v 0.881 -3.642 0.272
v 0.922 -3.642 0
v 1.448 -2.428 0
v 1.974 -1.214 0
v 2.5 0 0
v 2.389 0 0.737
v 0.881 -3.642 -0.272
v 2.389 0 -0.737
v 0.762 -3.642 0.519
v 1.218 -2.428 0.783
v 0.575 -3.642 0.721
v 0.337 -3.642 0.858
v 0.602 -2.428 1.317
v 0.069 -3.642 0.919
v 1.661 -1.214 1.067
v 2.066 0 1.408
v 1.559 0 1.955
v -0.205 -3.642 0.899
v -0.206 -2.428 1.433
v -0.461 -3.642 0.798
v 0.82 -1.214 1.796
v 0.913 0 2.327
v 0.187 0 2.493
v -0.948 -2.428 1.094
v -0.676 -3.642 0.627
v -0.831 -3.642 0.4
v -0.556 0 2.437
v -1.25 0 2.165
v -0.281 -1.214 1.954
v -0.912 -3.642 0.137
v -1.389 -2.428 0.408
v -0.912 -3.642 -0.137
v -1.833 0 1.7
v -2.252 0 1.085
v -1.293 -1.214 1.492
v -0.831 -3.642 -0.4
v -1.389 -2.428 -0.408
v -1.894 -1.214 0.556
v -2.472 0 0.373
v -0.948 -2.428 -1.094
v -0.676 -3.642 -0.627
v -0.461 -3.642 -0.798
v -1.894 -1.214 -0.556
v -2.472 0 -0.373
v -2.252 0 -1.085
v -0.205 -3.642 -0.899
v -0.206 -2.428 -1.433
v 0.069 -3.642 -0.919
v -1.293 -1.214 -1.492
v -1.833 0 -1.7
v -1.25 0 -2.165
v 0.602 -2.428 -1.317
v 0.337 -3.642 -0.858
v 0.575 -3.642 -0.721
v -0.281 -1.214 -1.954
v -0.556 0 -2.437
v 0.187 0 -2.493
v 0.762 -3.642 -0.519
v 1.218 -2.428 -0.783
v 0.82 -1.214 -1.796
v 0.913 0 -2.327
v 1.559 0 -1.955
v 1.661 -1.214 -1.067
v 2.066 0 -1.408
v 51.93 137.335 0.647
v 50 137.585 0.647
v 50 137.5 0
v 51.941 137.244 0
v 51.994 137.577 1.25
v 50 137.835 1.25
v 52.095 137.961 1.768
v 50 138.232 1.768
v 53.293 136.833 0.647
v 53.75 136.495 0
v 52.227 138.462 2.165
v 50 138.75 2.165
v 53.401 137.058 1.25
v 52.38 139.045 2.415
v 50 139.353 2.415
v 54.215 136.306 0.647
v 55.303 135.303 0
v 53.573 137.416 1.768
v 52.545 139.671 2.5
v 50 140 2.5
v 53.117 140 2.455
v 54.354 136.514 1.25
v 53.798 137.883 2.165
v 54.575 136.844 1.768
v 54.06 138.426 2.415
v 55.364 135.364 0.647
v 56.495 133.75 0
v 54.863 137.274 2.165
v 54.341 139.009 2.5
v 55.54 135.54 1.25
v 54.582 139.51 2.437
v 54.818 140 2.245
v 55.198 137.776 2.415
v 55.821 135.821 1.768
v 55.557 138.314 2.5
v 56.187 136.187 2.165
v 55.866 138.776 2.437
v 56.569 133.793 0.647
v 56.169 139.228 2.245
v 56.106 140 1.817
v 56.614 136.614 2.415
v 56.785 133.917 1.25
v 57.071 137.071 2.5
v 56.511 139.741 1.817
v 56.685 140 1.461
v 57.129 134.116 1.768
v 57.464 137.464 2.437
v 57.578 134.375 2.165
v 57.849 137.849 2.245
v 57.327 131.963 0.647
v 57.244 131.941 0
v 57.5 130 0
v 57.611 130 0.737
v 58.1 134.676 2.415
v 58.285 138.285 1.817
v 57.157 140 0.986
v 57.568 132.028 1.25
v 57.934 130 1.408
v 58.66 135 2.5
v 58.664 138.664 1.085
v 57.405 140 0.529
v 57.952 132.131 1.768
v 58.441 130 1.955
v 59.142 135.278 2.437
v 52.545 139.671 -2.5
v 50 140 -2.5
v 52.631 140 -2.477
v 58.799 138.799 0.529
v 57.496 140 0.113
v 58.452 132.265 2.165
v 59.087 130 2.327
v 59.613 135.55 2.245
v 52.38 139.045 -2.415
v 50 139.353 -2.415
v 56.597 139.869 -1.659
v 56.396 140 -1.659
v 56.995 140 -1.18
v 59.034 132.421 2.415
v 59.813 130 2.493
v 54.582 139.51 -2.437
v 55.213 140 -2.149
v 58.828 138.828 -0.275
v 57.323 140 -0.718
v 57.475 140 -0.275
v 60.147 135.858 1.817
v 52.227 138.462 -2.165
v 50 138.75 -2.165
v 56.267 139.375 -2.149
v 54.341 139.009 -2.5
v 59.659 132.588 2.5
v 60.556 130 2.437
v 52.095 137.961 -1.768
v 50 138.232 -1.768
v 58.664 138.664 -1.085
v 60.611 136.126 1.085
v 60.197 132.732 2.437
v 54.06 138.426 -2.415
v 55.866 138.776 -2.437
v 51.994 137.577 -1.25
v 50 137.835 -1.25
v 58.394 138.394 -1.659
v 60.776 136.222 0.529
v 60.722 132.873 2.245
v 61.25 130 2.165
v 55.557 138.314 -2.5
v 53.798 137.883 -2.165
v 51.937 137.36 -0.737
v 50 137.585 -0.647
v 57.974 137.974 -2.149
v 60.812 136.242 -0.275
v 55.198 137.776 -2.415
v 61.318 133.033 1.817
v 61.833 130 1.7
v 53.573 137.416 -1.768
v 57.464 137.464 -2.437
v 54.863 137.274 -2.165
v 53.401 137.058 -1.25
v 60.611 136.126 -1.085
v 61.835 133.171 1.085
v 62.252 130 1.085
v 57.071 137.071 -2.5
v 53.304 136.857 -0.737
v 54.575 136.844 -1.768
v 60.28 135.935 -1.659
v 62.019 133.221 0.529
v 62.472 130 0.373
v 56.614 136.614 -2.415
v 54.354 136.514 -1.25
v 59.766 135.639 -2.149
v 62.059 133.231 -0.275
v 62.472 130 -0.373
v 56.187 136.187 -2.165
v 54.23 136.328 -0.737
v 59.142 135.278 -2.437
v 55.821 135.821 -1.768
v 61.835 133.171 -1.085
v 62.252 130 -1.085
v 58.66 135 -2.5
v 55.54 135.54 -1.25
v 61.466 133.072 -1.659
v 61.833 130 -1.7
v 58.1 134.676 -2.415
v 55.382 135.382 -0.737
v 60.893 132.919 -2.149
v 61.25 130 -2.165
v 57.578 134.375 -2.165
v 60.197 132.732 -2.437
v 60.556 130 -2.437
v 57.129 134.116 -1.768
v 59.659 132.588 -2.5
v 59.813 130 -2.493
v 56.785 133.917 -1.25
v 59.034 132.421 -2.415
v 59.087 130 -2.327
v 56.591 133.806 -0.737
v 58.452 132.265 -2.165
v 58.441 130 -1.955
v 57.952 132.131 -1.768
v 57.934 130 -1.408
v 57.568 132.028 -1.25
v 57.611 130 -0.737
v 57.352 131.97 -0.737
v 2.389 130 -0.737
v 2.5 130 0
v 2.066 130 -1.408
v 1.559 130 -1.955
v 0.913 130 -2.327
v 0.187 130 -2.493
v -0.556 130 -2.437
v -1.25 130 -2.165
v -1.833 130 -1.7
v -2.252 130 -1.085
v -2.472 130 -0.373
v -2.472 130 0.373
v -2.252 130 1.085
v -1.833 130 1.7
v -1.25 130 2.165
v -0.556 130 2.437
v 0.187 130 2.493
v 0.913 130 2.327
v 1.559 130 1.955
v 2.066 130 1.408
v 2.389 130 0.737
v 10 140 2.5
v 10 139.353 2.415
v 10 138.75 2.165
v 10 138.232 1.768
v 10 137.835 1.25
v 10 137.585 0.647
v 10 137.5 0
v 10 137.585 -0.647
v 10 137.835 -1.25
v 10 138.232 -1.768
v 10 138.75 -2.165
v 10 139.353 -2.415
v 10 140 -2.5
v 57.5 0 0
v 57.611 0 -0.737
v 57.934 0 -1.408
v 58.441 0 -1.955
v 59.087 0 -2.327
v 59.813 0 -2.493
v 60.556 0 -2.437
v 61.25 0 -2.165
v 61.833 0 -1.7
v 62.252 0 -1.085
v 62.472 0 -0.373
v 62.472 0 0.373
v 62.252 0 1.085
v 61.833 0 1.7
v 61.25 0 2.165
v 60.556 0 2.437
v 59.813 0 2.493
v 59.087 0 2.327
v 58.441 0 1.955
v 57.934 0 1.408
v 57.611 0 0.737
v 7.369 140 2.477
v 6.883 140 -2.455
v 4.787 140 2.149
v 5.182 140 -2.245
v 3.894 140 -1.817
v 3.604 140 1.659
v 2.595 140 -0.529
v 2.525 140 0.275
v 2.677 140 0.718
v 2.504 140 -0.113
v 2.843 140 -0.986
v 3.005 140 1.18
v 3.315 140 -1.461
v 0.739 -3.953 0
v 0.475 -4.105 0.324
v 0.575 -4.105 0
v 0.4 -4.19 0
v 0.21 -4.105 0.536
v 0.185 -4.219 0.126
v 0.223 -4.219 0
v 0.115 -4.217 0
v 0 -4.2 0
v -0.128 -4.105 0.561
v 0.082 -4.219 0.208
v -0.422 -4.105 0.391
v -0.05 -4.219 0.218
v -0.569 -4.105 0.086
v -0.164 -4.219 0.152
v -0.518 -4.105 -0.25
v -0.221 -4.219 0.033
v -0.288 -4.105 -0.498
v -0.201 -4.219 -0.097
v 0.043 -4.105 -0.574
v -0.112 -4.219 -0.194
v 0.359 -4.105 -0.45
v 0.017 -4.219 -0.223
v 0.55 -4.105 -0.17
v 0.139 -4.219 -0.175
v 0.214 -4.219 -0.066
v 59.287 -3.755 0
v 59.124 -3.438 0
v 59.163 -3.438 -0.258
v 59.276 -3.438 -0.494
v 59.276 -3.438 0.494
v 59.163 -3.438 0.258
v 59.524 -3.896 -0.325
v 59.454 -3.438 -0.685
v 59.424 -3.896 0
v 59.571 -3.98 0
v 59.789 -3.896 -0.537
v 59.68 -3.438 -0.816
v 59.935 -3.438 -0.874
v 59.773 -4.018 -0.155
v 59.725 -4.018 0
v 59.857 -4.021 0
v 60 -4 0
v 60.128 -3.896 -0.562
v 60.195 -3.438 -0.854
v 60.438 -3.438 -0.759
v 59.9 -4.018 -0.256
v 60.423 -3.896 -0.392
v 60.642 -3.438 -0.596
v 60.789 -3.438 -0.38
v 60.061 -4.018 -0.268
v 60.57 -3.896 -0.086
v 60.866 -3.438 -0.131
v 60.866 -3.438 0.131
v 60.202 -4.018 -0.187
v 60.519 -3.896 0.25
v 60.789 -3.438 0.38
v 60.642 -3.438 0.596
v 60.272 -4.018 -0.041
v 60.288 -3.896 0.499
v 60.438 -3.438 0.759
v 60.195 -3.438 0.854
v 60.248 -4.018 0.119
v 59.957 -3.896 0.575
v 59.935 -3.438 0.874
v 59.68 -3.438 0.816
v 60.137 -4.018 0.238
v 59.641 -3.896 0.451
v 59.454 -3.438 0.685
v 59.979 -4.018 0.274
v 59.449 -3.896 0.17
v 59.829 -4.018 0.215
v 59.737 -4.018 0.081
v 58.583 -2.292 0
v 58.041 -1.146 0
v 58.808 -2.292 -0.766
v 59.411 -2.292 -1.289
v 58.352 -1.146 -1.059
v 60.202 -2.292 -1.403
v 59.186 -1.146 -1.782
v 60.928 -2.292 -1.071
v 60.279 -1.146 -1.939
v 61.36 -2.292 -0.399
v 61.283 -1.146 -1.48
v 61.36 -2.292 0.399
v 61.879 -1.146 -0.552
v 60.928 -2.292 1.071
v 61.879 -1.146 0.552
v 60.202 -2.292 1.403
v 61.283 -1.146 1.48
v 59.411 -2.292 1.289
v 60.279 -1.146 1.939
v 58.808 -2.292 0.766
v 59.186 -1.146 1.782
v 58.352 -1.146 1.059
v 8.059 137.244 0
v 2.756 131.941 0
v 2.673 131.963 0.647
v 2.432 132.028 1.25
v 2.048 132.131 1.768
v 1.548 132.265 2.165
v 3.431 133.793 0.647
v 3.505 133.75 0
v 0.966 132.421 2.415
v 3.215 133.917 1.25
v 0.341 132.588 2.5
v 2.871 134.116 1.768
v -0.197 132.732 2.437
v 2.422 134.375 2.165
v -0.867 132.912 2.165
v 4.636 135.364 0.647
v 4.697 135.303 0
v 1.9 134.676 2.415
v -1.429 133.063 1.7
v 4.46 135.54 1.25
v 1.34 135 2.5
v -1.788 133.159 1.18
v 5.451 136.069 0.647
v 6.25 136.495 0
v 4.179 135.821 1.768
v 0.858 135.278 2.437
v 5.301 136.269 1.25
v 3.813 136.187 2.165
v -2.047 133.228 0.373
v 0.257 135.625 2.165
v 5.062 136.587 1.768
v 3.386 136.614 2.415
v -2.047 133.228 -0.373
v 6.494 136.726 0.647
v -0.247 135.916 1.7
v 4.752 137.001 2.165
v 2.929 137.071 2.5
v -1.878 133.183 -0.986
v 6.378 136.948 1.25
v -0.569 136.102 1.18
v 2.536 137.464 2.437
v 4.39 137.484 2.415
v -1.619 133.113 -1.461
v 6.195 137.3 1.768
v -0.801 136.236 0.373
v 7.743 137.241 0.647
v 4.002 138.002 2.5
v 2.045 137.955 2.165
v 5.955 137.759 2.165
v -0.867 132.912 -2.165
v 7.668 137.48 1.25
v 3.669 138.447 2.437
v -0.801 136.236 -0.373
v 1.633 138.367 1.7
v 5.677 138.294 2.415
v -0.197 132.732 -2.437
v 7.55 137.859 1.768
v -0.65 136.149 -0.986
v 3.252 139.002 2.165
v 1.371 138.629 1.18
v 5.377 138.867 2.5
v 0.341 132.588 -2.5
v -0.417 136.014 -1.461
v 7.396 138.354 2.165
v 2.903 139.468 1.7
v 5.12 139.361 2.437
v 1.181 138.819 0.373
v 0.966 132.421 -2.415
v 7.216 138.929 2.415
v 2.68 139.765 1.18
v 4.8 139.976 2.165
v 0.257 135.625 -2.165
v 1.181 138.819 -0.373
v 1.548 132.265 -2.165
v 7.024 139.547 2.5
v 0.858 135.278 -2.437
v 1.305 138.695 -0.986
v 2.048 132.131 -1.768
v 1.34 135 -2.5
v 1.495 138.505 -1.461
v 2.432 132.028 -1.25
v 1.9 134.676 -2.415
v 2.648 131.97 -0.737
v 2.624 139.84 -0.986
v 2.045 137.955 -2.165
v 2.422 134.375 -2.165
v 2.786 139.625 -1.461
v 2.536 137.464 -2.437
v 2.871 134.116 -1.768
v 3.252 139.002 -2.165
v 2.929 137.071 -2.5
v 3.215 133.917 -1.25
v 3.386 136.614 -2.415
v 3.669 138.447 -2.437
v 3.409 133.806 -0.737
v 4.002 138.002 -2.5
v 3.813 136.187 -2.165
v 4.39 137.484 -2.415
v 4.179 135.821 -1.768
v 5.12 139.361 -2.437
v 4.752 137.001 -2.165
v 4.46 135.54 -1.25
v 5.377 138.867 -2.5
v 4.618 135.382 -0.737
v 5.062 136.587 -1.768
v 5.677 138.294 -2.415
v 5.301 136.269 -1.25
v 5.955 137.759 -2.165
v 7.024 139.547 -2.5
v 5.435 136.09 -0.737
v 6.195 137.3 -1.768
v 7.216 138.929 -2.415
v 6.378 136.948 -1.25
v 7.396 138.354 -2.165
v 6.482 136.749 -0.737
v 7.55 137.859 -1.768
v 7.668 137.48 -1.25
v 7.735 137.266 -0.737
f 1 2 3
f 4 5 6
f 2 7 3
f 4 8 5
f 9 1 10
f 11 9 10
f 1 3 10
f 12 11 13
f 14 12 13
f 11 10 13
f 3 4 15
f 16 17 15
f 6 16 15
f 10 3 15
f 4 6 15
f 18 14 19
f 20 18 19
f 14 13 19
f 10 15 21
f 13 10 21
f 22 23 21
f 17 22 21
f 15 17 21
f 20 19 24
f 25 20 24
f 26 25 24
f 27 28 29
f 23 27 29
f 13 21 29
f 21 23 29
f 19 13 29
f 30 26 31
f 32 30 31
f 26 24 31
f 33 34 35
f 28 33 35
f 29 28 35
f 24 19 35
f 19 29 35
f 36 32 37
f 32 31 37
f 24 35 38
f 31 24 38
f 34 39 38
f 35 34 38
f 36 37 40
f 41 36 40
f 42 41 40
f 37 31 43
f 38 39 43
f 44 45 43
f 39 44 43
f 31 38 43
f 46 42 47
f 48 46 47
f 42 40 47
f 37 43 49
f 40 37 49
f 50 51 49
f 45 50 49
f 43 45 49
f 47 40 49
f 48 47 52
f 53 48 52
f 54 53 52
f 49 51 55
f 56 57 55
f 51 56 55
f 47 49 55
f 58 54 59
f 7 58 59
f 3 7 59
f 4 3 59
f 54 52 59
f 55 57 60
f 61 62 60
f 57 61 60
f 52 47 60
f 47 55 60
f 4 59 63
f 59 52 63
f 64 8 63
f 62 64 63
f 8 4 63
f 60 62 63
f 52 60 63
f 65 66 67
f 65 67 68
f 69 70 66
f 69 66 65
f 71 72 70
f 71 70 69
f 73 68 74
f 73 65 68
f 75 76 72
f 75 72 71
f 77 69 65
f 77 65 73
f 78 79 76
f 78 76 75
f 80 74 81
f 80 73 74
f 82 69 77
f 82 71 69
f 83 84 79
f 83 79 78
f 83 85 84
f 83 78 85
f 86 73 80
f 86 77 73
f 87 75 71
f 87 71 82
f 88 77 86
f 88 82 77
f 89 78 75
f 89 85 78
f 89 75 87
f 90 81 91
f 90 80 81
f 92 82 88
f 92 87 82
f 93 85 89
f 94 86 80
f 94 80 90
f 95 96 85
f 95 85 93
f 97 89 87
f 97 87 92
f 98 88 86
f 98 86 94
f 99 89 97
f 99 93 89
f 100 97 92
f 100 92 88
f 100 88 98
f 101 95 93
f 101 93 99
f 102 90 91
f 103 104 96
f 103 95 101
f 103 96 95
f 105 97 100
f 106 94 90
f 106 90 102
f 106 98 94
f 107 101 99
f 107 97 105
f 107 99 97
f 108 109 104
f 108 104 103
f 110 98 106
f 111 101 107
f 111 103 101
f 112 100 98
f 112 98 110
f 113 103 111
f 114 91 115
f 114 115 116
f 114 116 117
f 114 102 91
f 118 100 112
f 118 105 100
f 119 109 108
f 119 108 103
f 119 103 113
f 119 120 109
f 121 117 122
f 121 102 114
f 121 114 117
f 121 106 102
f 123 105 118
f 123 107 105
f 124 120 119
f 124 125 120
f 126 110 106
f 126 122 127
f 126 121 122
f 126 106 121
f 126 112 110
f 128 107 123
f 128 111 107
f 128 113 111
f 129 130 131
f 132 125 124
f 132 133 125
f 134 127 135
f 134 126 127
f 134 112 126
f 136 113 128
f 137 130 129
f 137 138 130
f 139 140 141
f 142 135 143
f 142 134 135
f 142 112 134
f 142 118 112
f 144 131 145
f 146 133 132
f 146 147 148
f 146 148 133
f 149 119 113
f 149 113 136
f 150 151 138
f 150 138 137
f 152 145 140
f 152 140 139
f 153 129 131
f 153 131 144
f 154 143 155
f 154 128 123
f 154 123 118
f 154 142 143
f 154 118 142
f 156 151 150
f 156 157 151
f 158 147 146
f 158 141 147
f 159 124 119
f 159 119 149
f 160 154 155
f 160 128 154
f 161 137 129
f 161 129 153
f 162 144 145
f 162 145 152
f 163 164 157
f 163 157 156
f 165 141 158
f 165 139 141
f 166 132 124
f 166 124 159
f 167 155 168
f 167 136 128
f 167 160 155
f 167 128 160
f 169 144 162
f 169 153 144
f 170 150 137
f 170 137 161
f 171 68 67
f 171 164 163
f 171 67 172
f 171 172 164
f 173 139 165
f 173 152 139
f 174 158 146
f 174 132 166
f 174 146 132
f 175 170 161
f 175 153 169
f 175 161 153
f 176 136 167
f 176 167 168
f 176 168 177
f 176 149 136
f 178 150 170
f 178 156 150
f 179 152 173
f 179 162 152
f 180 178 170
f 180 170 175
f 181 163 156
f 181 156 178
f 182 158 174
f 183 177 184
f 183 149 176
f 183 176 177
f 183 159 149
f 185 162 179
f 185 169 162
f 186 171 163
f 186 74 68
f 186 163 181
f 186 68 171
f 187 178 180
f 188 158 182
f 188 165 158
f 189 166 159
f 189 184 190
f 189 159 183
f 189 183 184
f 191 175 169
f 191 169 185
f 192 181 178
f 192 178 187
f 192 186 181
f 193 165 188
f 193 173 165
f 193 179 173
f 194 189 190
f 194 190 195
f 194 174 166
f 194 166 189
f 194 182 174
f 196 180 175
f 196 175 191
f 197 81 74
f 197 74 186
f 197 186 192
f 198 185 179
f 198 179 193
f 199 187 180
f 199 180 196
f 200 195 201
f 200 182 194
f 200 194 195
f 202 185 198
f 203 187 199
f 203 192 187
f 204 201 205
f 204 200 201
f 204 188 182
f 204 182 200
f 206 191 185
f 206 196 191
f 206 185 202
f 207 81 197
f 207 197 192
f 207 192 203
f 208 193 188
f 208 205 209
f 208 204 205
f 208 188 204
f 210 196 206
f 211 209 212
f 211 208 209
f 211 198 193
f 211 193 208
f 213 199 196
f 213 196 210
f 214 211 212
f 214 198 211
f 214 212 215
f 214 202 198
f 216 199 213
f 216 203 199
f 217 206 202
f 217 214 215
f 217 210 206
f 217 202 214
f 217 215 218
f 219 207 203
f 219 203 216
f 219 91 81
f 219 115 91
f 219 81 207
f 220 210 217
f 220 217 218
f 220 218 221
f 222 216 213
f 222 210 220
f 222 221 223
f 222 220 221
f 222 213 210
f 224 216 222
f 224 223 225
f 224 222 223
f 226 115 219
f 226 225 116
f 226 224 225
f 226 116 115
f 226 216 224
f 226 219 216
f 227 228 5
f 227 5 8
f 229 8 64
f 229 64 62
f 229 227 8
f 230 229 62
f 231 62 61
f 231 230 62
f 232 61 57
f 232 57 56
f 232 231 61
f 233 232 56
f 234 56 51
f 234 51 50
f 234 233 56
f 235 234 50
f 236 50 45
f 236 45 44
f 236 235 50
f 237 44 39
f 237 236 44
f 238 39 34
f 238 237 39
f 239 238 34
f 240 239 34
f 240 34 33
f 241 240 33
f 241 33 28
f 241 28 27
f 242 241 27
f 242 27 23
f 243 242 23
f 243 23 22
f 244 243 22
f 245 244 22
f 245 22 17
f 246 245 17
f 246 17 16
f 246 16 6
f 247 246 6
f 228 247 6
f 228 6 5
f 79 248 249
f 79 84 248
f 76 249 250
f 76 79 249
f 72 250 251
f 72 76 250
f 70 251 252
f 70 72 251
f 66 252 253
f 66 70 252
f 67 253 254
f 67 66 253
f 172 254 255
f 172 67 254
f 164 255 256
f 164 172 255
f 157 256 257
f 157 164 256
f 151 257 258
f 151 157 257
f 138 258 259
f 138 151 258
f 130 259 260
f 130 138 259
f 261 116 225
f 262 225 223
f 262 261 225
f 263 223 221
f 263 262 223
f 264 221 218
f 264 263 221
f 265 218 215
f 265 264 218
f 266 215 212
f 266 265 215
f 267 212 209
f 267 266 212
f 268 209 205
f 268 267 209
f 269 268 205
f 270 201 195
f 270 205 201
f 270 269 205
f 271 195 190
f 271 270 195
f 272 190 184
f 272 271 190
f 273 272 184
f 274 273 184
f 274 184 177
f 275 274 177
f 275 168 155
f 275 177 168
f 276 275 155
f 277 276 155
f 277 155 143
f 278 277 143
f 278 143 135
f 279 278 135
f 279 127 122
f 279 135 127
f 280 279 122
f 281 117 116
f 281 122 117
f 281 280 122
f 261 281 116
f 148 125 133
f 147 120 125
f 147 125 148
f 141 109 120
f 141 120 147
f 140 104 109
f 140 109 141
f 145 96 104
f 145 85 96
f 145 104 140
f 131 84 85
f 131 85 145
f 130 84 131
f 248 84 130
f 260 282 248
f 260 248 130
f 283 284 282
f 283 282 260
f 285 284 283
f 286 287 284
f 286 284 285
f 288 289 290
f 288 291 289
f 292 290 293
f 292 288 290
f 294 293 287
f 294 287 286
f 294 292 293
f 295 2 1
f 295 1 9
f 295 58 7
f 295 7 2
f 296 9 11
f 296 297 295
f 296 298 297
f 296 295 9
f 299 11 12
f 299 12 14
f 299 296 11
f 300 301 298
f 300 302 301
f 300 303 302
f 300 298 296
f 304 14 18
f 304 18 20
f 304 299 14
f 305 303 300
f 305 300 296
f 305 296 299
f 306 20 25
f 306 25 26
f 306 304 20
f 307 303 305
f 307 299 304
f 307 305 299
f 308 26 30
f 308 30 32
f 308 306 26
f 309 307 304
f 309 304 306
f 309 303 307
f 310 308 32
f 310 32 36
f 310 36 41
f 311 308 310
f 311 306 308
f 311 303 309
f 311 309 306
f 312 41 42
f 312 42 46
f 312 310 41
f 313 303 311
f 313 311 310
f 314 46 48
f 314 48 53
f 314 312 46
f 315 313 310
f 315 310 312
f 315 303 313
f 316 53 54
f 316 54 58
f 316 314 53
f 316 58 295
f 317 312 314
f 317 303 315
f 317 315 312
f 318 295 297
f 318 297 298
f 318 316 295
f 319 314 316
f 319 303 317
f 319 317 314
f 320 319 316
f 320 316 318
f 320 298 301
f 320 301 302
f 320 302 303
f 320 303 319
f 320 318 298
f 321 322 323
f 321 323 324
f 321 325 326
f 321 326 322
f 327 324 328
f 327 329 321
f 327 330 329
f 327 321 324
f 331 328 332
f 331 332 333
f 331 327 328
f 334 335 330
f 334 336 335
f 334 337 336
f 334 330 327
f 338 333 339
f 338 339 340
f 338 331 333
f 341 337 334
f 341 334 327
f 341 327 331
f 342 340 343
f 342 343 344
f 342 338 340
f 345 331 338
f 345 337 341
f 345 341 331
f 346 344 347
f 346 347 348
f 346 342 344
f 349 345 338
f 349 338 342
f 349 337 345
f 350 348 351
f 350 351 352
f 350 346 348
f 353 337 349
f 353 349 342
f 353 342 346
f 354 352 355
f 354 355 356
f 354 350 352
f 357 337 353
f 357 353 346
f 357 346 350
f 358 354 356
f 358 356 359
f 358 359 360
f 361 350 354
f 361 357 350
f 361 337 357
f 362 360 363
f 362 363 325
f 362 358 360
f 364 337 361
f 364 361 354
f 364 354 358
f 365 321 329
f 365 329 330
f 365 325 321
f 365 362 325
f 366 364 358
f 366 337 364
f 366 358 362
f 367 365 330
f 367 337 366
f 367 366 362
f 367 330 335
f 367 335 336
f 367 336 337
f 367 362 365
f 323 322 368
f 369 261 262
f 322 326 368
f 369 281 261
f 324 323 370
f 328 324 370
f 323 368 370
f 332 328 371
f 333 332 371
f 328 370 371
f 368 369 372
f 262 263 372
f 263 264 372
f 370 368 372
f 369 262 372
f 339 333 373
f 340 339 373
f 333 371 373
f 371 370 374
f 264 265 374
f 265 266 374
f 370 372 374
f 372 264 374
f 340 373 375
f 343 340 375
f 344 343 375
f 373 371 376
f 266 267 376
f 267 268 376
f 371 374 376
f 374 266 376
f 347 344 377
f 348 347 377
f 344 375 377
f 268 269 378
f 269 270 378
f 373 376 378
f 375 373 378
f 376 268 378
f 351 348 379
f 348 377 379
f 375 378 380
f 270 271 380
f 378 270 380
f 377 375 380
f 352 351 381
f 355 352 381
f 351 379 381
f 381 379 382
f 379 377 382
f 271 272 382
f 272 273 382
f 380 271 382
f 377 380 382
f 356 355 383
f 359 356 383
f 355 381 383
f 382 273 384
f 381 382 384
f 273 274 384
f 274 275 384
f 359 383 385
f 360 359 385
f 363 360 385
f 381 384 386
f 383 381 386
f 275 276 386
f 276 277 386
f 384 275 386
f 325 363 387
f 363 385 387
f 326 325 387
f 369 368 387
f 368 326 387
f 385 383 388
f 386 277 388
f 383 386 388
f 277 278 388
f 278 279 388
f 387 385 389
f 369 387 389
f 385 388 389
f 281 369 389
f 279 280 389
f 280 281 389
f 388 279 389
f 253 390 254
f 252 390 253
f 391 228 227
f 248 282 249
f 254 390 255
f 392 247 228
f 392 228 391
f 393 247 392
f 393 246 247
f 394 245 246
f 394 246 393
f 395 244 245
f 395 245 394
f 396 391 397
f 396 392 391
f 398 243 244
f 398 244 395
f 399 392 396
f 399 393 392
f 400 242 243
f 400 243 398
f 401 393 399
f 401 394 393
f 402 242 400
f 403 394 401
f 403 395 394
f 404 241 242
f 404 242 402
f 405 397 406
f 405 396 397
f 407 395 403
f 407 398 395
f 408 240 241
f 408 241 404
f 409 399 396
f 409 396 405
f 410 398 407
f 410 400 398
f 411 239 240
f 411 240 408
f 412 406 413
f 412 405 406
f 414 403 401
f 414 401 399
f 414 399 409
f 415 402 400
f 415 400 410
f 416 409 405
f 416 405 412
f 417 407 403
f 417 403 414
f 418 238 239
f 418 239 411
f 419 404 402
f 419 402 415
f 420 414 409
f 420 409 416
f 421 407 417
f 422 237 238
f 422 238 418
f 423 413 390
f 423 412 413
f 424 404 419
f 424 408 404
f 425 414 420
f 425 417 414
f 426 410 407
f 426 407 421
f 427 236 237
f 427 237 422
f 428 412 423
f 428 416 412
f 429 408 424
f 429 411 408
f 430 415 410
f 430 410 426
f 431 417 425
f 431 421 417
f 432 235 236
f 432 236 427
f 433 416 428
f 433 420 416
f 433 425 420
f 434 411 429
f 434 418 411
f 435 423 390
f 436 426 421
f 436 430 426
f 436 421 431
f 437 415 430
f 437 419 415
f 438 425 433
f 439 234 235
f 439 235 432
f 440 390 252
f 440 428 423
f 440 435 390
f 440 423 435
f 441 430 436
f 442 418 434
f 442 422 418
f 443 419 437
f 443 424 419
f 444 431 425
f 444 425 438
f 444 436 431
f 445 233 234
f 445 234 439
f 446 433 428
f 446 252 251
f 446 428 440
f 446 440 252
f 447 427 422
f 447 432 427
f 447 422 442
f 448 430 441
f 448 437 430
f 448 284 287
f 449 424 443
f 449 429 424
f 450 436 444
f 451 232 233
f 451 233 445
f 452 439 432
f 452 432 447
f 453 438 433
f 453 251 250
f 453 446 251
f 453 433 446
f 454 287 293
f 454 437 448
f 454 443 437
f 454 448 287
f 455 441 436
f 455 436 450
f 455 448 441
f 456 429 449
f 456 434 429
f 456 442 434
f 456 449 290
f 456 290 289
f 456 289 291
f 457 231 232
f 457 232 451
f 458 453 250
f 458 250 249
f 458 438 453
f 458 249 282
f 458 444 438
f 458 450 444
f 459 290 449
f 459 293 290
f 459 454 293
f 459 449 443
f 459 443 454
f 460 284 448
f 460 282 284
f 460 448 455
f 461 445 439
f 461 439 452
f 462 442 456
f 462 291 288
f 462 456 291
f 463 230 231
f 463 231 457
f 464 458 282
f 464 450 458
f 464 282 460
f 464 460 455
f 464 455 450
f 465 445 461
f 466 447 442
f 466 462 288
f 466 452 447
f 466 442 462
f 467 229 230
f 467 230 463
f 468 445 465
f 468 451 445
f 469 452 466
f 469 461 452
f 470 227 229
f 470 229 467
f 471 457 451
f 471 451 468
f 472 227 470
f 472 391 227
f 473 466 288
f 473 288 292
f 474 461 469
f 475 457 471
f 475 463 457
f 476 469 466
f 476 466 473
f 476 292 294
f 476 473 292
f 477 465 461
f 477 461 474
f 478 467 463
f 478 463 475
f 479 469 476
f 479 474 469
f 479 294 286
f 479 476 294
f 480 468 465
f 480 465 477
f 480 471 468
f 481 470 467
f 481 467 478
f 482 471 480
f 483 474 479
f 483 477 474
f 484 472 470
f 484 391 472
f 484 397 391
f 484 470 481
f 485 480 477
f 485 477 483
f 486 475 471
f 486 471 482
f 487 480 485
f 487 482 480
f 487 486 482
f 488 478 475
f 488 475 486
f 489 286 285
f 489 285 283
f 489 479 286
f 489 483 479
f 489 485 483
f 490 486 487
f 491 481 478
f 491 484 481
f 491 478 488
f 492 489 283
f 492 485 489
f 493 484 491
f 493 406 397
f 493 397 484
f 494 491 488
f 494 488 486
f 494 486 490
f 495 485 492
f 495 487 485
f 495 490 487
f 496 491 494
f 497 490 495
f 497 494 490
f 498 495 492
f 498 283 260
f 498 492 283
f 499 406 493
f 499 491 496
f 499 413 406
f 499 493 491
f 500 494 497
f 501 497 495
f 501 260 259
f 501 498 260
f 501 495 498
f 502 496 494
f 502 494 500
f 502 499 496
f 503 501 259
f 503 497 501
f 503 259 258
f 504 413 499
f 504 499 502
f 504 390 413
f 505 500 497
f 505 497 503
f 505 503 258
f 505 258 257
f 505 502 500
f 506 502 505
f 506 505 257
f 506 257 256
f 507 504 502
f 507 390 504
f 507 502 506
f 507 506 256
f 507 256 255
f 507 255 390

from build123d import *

# Parameters (mm, degrees)
SKETCH3_R          = 2.5
SKETCH7_W          = 6.517782954
SKETCH7_H          = 4.322109435
CUT_EXTRUDE1_DEPTH = 72


with BuildPart() as part:
    # Sweep1: sweep along a path in Sketch4
    with BuildLine(Plane.XY) as sweep1_path:
        Line((0, 0), (0, 130))
        ThreePointArc((0, 130), (2.928932188, 137.071067812), (10, 140))
        Line((10, 140), (50, 140))
        ThreePointArc((50, 140), (57.071067812, 137.071067812), (60, 130))
        Line((60, 130), (60, 24.600902506))
        Line((60, 24.600902506), (60, 0))
    # Sketch3 → Sweep1 (sweep)
    with BuildSketch(Plane(origin=(0, 0, 0), x_dir=(1, 0, 0), z_dir=(0, 1, 0))):
        Circle(SKETCH3_R)
    sweep(path=sweep1_path.line)

    # Sketch5 → Revolve1 (revolve)
    with BuildSketch(Plane.XY):
        with BuildLine():
            Line((0, 0), (0, -4.2))
            add(Edge.make_bspline(
                [(0.921927602, -3.641780971), (0.629243953, -4.327906562), (0, -4.2)],
                knots=[0, 0, 0, 1, 1, 1], degree=2))
            Line((0.921927602, -3.641780971), (2.5, 0))
            Line((2.5, 0), (0, 0))
        make_face()
    revolve(axis=Axis((0, 0, 0), (0, -1, 0)))

    # Sketch6 → Revolve2 (revolve)
    with BuildSketch(Plane.XY):
        with BuildLine():
            Line((57.5, 0), (60, 0))
            Line((60, 0), (60, -4))
            add(Edge.make_bspline(
                [(59.123790654, -3.437958358), (59.375682143, -4.137387225), (60, -4)],
                knots=[0, 0, 0, 1, 1, 1], degree=2))
            Line((59.123790654, -3.437958358), (57.5, 0))
        make_face()
    revolve(axis=Axis((60, 0, 0), (0, -1, 0)))

    # Sketch7 → Cut-Extrude1 (cut)
    with BuildSketch(Plane(origin=(0, 0, 0), x_dir=(0, 0, -1), z_dir=(1, 0, 0))):
        with Locations((-0.143512102, 142.161054718)):
            Rectangle(SKETCH7_W, SKETCH7_H)
    extrude(amount=CUT_EXTRUDE1_DEPTH, mode=Mode.SUBTRACT)


solid = part.part
